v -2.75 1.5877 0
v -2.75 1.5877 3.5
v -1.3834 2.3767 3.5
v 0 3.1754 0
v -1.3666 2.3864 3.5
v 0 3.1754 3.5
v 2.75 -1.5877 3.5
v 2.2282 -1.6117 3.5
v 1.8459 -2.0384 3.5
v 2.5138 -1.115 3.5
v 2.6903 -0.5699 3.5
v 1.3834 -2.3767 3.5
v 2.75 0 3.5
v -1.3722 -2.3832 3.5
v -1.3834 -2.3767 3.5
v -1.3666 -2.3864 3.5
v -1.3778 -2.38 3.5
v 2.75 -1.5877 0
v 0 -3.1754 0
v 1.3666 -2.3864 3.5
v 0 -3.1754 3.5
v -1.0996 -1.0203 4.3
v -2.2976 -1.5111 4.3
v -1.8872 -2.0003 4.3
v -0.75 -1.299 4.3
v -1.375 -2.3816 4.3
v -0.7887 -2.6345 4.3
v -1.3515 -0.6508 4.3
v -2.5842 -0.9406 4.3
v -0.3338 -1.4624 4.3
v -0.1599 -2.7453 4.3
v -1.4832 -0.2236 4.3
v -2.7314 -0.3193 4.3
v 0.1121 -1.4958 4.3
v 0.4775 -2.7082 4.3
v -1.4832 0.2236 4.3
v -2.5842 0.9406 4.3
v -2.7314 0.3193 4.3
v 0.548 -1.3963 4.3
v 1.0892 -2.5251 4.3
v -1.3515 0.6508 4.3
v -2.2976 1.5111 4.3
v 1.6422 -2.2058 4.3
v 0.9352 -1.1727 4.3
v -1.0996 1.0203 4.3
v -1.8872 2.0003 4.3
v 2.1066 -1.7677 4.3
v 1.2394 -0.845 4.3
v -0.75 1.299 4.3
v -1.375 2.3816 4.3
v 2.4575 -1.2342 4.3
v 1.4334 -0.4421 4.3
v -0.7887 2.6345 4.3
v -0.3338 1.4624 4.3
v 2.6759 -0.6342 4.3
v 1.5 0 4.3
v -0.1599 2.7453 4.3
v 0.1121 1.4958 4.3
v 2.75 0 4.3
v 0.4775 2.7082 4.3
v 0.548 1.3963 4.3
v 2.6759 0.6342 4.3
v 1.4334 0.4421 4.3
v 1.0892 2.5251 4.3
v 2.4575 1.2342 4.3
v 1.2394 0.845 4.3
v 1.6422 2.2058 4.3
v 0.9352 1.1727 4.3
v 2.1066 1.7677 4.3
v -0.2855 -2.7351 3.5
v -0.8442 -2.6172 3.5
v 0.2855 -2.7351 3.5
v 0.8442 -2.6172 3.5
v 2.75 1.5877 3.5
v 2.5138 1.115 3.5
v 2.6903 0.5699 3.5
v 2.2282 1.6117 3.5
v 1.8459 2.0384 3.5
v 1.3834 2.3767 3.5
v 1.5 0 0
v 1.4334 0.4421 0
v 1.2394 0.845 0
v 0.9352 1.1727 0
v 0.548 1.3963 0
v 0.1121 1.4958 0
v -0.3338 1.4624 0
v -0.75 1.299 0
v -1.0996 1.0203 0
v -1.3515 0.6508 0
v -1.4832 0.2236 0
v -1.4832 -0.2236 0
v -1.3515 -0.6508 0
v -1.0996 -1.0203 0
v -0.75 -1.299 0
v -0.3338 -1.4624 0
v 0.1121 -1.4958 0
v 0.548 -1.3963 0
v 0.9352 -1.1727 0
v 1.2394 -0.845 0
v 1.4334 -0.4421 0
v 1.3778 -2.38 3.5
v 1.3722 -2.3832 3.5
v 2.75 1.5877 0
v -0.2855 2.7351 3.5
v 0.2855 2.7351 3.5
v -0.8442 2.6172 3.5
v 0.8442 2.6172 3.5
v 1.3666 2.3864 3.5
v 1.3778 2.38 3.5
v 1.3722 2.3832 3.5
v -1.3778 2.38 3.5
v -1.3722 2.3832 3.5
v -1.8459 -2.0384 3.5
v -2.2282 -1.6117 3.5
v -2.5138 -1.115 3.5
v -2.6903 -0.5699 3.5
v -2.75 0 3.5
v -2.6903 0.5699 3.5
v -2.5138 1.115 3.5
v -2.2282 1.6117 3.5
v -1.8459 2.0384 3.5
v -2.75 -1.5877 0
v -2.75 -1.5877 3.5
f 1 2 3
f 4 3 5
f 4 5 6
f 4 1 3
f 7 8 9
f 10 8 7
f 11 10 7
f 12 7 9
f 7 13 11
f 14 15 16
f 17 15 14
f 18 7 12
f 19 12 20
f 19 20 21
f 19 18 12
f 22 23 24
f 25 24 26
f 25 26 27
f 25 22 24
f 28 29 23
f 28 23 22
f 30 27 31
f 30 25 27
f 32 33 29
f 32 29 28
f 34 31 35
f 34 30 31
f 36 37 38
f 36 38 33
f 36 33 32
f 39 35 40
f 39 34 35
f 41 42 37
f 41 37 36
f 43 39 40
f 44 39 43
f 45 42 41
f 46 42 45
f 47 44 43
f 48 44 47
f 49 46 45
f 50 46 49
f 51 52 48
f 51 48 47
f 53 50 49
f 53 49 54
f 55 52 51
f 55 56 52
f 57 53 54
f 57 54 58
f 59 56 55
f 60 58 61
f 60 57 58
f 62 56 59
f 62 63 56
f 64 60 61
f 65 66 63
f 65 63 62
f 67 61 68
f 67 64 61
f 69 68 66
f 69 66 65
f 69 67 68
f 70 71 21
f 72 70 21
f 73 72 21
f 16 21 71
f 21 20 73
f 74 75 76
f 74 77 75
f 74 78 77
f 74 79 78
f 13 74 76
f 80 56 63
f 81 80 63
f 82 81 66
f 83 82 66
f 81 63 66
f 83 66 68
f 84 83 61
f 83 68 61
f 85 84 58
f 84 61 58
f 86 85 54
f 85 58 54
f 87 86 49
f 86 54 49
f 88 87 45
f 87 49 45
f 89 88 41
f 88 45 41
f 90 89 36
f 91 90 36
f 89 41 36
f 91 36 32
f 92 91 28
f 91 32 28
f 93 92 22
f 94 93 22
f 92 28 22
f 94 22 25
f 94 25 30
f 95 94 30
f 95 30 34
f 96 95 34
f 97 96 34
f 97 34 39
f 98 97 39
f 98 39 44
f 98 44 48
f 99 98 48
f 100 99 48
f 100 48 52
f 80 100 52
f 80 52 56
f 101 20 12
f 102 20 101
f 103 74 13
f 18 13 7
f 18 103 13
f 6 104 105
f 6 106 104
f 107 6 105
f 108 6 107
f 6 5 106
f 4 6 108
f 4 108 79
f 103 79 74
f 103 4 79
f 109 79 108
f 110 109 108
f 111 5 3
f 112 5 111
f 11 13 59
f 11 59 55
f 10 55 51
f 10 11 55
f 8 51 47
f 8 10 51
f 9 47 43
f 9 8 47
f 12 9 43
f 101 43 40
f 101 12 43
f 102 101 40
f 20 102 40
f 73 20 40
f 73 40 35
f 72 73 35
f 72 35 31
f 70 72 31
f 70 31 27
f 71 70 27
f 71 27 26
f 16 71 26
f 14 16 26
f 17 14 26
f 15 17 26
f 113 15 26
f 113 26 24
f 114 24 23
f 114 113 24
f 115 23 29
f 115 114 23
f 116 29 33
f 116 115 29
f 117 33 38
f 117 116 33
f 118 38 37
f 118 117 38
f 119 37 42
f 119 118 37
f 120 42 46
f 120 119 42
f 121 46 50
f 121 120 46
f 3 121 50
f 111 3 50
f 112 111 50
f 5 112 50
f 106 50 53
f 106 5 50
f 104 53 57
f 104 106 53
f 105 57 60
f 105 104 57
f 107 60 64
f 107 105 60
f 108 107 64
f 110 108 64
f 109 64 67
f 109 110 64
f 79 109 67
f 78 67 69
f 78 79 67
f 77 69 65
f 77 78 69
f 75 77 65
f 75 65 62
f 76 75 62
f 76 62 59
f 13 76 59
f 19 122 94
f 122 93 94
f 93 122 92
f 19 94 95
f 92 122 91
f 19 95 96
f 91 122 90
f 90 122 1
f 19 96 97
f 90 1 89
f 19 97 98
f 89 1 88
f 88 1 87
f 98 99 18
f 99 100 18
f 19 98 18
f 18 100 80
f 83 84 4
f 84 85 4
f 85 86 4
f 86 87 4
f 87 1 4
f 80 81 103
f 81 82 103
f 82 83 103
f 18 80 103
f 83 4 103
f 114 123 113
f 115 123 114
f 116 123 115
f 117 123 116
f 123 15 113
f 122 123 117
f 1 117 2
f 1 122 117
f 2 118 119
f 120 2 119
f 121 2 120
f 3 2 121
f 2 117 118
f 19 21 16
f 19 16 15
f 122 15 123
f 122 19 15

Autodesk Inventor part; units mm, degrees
ref_plane "YZ Plane" through (0, 0, 0) normal (1, 0, 0) x (0, 1, 0)
ref_plane "XZ Plane" through (0, 0, 0) normal (0, 1, 0) x (-1, 0, 0)
ref_plane "XY Plane" through (0, 0, 0) normal (0, 0, 1) x (1, 0, 0)
sketch "スケッチ1" plane through (0, 0, 0) normal (0, 0, 1) x (1, 0, 0)
  line L0 (0, 3.1754) -> (2.75, 1.5877)
  line L1 (2.75, 1.5877) -> (2.75, -1.5877)
  line L2 (2.75, -1.5877) -> (0, -3.1754)
  line L3 (0, -3.1754) -> (-2.75, -1.5877)
  line L4 (-2.75, -1.5877) -> (-2.75, 1.5877)
  line L5 (-2.75, 1.5877) -> (0, 3.1754)
  point P0 (0, 0)
  point P1 (0, 0)
  dimension "d0" = 5.5
extrude "押し出し1" add sketch "スケッチ1" along normal blind 3.5
sketch "スケッチ2" plane through (0, 0, 3.5) normal (0, 0, 1) x (1, 0, 0)
  circle A0 centre (0, 0) radius 2.75
extrude "押し出し2" add sketch "スケッチ2" along normal blind 0.8
sketch "スケッチ3" plane through (0, 0, 4.3) normal (0, 0, 1) x (1, 0, 0)
  circle A0 centre (0, 0) radius 1.5
  dimension "d5" = 3
extrude "押し出し3" cut sketch "スケッチ3" against normal through all
properties part number "ナイロンナットm3" material "鉄、可鍛鉄"
